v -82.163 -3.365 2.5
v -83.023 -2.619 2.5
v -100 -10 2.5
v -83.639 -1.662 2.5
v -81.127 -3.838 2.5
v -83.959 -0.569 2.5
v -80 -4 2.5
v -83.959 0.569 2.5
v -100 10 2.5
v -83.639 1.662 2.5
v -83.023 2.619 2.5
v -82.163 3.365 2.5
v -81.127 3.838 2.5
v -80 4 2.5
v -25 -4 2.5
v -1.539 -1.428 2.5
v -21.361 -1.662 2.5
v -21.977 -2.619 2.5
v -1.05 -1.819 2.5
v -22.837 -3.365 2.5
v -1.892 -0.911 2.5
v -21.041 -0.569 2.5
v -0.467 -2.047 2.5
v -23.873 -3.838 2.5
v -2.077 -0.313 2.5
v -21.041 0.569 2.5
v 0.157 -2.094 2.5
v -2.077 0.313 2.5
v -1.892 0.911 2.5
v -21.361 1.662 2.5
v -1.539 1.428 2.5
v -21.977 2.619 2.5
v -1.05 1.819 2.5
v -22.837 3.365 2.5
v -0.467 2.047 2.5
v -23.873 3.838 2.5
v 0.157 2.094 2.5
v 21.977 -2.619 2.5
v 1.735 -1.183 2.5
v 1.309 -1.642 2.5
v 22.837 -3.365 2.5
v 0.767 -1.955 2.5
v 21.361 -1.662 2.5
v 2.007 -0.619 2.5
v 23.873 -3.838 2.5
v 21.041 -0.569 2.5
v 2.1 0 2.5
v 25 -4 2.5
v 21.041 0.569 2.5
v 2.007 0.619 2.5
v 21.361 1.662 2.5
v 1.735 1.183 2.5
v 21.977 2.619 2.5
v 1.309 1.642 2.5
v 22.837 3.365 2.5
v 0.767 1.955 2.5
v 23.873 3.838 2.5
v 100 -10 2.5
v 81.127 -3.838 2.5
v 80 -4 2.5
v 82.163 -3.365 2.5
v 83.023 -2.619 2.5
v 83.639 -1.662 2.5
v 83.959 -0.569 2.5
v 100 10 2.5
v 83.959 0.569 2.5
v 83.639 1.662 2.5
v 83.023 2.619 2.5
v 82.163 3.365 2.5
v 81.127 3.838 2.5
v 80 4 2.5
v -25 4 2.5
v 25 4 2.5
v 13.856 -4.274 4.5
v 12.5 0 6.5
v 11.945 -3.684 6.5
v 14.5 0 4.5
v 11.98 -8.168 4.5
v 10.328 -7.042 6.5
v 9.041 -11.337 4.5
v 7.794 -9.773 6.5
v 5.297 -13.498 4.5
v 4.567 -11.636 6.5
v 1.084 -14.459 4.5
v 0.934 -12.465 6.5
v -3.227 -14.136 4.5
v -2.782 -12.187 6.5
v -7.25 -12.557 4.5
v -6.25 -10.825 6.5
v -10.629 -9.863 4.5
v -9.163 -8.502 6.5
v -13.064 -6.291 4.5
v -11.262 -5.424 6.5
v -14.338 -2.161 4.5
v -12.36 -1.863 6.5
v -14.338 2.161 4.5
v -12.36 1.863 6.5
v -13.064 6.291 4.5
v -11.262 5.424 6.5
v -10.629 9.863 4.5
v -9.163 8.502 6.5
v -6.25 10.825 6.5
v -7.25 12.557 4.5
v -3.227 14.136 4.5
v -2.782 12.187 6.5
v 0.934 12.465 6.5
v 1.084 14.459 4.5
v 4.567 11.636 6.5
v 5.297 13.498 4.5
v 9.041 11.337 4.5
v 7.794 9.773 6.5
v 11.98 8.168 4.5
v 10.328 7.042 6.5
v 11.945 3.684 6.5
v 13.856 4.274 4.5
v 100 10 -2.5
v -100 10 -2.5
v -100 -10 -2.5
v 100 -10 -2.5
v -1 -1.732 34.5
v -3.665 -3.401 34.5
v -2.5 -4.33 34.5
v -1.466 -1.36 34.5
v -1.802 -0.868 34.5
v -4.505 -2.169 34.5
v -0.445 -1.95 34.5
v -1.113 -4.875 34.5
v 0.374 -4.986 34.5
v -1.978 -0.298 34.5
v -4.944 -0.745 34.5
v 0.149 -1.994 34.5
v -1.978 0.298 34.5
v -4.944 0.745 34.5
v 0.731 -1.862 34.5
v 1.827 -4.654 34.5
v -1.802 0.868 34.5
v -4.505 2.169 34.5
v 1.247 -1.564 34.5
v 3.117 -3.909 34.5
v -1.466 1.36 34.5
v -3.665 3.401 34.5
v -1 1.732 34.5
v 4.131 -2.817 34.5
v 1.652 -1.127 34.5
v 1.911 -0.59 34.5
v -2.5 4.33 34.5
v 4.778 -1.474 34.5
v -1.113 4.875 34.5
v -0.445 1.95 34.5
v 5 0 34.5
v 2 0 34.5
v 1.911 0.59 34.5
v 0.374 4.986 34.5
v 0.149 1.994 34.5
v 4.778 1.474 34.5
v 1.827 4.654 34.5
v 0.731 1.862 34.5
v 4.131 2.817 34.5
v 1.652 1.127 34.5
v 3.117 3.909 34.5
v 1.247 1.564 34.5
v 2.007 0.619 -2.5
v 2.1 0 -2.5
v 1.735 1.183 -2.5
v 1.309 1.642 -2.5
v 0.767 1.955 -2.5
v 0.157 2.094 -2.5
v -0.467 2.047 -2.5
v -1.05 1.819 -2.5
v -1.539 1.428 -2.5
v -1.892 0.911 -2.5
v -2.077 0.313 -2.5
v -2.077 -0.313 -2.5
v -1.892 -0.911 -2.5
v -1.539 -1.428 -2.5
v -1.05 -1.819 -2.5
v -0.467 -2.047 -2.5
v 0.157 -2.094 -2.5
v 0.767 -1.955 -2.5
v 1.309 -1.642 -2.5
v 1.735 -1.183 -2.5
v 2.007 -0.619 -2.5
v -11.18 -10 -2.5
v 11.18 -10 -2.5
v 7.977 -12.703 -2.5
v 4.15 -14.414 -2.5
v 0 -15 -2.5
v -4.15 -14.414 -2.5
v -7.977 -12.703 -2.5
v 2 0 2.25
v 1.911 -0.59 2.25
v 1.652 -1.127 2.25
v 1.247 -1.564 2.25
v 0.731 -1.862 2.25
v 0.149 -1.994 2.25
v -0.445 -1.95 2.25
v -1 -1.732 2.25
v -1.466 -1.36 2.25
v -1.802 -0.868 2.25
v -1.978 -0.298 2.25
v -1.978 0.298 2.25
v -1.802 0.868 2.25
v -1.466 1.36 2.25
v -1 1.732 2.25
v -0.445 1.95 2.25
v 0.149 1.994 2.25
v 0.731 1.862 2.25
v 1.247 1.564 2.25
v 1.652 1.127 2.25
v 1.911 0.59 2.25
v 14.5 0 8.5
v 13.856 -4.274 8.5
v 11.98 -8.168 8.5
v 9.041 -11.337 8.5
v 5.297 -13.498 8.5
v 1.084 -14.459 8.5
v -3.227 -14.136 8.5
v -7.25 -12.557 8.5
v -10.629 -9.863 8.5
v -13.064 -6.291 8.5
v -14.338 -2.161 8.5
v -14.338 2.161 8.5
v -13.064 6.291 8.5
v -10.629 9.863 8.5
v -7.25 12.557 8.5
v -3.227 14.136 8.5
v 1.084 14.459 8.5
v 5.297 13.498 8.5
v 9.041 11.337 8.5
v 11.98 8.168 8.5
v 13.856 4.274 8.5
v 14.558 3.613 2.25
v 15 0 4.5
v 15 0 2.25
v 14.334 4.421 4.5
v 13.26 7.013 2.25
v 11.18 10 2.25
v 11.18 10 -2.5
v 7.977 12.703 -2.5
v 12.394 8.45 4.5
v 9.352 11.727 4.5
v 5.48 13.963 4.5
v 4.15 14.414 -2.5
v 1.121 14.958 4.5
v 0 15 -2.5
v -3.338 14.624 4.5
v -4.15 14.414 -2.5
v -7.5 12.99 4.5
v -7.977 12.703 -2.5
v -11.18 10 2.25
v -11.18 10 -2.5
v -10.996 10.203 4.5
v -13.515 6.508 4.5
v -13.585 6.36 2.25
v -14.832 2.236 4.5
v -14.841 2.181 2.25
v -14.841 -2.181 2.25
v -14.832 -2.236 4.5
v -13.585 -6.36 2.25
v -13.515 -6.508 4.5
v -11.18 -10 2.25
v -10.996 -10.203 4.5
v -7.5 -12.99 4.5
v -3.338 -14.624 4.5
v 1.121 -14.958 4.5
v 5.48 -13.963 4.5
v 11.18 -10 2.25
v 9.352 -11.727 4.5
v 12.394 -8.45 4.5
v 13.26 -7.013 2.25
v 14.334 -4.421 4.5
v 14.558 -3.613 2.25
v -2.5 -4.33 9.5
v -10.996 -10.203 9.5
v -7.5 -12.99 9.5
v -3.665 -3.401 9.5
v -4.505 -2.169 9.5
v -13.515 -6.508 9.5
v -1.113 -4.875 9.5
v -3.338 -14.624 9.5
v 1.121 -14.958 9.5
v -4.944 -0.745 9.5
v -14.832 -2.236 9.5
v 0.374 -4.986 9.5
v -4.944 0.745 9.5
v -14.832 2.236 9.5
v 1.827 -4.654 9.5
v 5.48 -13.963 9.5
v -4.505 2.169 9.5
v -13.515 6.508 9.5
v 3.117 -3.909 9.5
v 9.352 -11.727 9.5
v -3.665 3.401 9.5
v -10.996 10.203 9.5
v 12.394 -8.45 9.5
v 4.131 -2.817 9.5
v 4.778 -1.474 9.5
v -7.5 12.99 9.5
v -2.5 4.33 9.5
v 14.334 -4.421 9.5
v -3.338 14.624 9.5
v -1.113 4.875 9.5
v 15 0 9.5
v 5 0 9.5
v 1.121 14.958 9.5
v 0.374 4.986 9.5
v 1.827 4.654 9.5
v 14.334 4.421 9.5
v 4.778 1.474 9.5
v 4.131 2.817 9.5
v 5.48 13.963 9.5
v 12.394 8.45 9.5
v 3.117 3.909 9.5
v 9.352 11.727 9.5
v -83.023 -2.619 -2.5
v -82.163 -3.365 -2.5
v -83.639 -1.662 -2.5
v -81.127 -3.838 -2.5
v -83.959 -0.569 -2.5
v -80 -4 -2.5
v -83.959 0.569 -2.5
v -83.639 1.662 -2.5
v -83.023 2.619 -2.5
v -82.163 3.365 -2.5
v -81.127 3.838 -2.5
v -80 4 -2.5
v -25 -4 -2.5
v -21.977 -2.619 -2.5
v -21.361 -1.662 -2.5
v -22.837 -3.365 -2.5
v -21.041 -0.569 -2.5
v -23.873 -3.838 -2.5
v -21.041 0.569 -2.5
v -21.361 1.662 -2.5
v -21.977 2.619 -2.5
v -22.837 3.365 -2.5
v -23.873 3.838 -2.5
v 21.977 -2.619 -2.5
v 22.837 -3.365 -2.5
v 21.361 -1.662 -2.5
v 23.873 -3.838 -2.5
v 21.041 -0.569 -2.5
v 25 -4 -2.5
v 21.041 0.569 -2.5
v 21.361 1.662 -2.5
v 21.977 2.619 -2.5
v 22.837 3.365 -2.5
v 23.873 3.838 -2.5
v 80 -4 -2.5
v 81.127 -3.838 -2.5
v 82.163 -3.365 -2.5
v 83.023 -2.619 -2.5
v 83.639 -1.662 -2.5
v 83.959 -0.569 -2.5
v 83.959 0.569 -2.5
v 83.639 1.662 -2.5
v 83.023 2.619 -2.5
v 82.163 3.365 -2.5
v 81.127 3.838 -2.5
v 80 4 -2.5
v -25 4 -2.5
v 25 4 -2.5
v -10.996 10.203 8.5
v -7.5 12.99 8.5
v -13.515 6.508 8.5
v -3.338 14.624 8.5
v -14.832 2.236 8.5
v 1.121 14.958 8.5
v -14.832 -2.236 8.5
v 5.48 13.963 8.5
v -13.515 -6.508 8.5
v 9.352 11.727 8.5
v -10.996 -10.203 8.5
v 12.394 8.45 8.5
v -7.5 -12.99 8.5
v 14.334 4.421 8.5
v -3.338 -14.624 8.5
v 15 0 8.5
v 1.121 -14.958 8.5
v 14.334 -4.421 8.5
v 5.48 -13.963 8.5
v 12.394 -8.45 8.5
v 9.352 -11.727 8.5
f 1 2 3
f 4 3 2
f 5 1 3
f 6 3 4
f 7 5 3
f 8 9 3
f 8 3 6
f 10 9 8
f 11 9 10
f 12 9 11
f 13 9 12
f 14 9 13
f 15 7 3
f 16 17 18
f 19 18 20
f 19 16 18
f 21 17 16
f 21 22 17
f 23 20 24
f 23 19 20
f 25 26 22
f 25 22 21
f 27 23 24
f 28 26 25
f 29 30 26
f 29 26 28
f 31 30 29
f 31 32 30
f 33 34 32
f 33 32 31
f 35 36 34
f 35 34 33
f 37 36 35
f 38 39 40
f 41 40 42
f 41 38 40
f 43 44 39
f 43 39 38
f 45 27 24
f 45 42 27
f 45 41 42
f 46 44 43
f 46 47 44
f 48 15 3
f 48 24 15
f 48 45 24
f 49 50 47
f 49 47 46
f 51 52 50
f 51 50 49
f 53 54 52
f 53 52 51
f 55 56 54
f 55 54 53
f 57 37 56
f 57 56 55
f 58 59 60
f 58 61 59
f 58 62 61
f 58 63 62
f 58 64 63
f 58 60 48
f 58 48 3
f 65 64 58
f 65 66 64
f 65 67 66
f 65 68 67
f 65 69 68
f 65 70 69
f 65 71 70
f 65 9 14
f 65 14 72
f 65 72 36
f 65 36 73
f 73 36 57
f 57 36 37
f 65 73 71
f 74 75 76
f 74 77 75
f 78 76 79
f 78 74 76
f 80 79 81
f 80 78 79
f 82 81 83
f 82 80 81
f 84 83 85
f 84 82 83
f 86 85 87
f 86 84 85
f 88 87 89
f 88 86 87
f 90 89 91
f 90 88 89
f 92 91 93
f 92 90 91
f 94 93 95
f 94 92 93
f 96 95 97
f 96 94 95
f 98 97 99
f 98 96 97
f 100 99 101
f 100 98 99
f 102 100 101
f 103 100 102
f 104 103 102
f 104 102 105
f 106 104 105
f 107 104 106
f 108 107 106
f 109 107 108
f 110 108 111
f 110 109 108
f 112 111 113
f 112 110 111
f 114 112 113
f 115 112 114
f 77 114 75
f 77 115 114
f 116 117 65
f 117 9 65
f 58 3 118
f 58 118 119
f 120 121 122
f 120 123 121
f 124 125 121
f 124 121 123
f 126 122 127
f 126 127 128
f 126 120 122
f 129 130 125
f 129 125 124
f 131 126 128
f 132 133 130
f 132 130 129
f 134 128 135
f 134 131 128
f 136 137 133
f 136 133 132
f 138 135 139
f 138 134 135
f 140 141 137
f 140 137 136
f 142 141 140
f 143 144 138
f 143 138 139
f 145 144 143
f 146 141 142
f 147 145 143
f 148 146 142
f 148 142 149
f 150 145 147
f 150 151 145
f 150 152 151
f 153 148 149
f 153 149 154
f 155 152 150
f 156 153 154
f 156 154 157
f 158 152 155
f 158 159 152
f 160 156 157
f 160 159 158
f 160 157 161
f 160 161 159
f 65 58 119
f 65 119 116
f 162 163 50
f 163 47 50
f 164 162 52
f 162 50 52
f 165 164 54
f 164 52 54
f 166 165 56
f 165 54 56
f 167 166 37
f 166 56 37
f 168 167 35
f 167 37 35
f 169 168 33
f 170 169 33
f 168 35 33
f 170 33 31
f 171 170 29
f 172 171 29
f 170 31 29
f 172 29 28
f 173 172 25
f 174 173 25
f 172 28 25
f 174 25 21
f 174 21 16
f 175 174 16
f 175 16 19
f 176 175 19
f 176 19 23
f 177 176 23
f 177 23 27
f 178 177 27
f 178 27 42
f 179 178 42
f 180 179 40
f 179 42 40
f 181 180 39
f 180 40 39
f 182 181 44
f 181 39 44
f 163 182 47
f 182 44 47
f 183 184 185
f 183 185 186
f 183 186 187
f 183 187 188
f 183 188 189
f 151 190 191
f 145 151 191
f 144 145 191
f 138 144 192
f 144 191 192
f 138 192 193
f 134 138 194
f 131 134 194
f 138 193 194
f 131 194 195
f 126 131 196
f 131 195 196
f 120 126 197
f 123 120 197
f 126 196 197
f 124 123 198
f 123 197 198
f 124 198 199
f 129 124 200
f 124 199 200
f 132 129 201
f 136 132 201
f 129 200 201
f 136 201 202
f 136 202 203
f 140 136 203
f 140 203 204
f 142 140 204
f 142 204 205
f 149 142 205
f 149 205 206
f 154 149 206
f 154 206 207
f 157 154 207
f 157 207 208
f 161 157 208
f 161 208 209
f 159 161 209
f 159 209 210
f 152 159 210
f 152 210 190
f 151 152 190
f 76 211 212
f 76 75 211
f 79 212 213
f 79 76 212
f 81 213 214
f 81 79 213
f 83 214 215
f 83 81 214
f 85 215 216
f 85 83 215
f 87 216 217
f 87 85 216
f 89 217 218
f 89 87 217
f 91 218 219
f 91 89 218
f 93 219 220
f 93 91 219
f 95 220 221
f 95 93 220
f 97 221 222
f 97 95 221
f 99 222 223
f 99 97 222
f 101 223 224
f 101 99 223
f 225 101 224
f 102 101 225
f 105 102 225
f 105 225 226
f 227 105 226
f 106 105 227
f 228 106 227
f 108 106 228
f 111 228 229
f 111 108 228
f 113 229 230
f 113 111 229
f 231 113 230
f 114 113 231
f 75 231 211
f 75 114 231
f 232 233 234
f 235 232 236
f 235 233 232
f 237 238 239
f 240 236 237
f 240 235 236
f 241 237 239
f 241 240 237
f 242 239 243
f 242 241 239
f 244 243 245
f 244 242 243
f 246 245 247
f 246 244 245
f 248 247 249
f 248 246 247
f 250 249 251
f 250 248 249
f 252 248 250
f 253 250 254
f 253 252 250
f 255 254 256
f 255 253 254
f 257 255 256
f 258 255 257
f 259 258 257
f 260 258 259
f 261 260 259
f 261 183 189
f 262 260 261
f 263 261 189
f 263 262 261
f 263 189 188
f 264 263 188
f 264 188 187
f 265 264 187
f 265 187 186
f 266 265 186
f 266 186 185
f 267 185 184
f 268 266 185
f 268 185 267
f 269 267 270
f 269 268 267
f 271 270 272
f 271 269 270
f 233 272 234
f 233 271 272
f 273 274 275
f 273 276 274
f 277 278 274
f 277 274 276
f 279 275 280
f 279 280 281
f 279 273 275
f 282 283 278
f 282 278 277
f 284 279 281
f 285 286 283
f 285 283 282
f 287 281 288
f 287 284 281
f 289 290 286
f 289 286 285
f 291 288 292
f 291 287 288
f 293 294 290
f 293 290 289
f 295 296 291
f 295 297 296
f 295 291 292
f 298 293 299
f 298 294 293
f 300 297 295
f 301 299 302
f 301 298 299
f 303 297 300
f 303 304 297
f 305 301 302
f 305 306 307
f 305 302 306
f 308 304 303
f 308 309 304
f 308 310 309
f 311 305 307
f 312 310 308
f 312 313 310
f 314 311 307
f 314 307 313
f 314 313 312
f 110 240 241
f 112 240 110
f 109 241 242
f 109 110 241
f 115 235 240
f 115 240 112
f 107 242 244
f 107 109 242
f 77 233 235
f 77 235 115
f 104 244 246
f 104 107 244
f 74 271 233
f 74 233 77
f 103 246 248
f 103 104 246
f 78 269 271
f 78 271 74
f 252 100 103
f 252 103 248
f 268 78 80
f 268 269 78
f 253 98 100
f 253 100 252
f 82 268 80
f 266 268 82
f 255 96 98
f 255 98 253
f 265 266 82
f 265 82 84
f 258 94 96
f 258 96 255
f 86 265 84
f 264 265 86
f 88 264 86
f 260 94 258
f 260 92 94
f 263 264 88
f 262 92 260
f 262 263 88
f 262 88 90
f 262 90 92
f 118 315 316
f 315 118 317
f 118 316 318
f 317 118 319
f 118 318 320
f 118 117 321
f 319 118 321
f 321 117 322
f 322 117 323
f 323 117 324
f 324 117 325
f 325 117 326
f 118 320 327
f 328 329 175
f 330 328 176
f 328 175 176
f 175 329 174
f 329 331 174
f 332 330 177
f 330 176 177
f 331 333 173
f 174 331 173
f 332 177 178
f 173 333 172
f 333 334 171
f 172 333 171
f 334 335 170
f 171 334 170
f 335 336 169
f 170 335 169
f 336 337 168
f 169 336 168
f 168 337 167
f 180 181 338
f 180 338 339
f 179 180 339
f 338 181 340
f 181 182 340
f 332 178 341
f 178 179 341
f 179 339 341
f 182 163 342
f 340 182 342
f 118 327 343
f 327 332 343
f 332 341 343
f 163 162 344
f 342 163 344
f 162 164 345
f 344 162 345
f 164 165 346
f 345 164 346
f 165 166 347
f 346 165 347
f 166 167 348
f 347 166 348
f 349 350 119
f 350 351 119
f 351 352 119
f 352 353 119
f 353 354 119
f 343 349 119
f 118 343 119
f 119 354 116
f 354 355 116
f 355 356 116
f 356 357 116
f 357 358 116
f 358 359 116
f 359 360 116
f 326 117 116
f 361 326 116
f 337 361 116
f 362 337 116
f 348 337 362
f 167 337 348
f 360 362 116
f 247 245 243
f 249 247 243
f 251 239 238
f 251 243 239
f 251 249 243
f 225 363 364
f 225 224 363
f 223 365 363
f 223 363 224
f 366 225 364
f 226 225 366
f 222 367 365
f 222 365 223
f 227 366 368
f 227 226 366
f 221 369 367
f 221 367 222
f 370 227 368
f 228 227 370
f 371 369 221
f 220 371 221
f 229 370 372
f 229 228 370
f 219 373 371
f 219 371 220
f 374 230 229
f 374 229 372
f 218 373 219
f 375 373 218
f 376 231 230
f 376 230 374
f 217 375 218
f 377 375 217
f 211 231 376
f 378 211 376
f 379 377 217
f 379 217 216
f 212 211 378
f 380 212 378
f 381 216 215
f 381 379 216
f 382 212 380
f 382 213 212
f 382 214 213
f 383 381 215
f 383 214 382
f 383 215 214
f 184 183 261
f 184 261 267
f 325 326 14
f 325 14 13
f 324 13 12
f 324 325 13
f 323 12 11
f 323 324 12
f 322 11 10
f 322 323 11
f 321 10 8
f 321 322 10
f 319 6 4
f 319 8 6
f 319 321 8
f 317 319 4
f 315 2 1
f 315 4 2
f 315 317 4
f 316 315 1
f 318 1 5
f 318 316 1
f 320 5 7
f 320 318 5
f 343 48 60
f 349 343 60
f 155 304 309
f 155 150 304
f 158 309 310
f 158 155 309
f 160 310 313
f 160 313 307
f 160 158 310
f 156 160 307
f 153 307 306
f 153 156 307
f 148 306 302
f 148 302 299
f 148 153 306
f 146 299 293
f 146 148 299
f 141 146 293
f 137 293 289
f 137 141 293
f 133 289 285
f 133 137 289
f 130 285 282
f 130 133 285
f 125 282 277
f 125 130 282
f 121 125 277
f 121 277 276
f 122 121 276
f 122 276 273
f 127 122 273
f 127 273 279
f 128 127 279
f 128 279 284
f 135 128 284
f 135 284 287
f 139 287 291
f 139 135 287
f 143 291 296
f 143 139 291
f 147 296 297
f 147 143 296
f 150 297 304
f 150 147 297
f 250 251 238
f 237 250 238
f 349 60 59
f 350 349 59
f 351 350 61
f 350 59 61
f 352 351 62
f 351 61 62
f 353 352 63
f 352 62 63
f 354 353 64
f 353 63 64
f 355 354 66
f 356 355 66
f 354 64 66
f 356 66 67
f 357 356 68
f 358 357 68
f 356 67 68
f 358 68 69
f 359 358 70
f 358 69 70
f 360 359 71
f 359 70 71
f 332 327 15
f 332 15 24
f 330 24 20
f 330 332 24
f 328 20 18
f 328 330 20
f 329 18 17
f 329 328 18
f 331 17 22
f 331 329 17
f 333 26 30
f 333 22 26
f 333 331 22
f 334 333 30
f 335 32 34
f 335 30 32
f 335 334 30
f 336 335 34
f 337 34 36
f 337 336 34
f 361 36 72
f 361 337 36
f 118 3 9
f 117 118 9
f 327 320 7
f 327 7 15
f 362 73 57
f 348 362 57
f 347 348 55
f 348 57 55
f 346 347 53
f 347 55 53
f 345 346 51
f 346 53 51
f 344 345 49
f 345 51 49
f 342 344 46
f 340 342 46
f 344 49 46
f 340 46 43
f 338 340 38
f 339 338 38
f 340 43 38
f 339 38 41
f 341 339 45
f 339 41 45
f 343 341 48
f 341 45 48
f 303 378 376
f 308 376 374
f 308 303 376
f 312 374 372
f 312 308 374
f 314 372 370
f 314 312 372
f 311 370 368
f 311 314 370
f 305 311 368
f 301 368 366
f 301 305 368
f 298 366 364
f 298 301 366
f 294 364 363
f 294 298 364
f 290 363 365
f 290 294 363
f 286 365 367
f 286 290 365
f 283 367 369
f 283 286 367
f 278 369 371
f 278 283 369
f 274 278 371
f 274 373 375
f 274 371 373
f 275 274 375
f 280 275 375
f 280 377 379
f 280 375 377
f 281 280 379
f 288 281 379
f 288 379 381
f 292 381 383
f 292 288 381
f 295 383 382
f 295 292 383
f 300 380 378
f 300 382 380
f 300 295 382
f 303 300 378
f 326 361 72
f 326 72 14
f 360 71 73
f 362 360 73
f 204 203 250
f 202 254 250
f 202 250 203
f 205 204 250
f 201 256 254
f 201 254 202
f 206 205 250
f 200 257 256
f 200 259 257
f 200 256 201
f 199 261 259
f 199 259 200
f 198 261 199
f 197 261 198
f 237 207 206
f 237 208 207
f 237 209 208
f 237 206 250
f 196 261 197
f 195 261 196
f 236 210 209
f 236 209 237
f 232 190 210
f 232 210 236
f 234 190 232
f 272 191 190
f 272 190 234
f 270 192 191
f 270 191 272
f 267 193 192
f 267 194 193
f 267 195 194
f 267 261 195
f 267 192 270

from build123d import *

# Parameters (mm, degrees)
F0_W          = 200
F0_H          = 20
F1_DEPTH      = 2.5
F2_R          = 2.1
F3_DEPTH      = 2.501
F3_DEPTH_BACK = 2.501
F5_DEPTH      = 12.5
F10_W         = 200
F10_H         = 20
F11_DEPTH     = 4.75
F12_R         = 2
F13_DEPTH     = 32.251


with BuildPart() as f1:
    # F0 (on Top) → F1 (new body, symmetric)
    with BuildSketch(Plane.XY):
        Rectangle(F0_W, F0_H)
    extrude(amount=F1_DEPTH, both=True)

    # F2 (on Top) → F3 (cut, two sides)
    with BuildSketch(Plane.XY) as f3_sk:
        Circle(F2_R)
    extrude(amount=F3_DEPTH, mode=Mode.SUBTRACT)
    extrude(f3_sk.sketch, amount=-F3_DEPTH_BACK, mode=Mode.SUBTRACT)

    # F4 (on Top) → F5 (cut, symmetric)
    with BuildSketch(Plane.XY):
        with BuildLine():
            ThreePointArc((-80, 4), (-84, 0), (-80, -4))
            Line((-80, -4), (-25, -4))
            ThreePointArc((-25, -4), (-21, 0), (-25, 4))
            Line((-25, 4), (-80, 4))
        make_face()
        with BuildLine():
            Line((80, 4), (25, 4))
            ThreePointArc((25, 4), (21, 0), (25, -4))
            Line((25, -4), (80, -4))
            ThreePointArc((80, -4), (84, 0), (80, 4))
        make_face()
    extrude(amount=F5_DEPTH, both=True, mode=Mode.SUBTRACT)


with BuildPart() as f7:
    # F6 (on Front) → F7 (revolve)
    with BuildSketch(Plane.XZ):
        Polygon((0, 34.5), (0, -2.5), (15, -2.5), (15, 9.5), (5, 9.5), (5, 34.5), align=None)
    revolve(axis=Axis((0, 0, 18.5031344495), (0, 0, 1)))

    # F8 (on Front) → F9 (revolve, cut)
    with BuildSketch(Plane.XZ):
        Polygon((15, 4.5), (15, 8.5), (14.5, 8.5), (12.5, 6.5), (14.5, 4.5), align=None)
    revolve(axis=Axis((0, 0, 16), (0, 0, -1)), mode=Mode.SUBTRACT)

    # F10 (on face) → F11 (cut)
    with BuildSketch(Plane(origin=(0, 0, -2.5), x_dir=(1, 0, 0), z_dir=(0, 0, -1))):
        Rectangle(F10_W, F10_H)
    extrude(amount=-F11_DEPTH, mode=Mode.SUBTRACT)

    # F12 (on face) → F13 (cut, through all)
    with BuildSketch(Plane(origin=(0, 0, 2.25), x_dir=(1, 0, 0), z_dir=(0, 0, -1))):
        Circle(F12_R)
    extrude(amount=-F13_DEPTH, mode=Mode.SUBTRACT)


solid = Compound([f1.part, f7.part])
